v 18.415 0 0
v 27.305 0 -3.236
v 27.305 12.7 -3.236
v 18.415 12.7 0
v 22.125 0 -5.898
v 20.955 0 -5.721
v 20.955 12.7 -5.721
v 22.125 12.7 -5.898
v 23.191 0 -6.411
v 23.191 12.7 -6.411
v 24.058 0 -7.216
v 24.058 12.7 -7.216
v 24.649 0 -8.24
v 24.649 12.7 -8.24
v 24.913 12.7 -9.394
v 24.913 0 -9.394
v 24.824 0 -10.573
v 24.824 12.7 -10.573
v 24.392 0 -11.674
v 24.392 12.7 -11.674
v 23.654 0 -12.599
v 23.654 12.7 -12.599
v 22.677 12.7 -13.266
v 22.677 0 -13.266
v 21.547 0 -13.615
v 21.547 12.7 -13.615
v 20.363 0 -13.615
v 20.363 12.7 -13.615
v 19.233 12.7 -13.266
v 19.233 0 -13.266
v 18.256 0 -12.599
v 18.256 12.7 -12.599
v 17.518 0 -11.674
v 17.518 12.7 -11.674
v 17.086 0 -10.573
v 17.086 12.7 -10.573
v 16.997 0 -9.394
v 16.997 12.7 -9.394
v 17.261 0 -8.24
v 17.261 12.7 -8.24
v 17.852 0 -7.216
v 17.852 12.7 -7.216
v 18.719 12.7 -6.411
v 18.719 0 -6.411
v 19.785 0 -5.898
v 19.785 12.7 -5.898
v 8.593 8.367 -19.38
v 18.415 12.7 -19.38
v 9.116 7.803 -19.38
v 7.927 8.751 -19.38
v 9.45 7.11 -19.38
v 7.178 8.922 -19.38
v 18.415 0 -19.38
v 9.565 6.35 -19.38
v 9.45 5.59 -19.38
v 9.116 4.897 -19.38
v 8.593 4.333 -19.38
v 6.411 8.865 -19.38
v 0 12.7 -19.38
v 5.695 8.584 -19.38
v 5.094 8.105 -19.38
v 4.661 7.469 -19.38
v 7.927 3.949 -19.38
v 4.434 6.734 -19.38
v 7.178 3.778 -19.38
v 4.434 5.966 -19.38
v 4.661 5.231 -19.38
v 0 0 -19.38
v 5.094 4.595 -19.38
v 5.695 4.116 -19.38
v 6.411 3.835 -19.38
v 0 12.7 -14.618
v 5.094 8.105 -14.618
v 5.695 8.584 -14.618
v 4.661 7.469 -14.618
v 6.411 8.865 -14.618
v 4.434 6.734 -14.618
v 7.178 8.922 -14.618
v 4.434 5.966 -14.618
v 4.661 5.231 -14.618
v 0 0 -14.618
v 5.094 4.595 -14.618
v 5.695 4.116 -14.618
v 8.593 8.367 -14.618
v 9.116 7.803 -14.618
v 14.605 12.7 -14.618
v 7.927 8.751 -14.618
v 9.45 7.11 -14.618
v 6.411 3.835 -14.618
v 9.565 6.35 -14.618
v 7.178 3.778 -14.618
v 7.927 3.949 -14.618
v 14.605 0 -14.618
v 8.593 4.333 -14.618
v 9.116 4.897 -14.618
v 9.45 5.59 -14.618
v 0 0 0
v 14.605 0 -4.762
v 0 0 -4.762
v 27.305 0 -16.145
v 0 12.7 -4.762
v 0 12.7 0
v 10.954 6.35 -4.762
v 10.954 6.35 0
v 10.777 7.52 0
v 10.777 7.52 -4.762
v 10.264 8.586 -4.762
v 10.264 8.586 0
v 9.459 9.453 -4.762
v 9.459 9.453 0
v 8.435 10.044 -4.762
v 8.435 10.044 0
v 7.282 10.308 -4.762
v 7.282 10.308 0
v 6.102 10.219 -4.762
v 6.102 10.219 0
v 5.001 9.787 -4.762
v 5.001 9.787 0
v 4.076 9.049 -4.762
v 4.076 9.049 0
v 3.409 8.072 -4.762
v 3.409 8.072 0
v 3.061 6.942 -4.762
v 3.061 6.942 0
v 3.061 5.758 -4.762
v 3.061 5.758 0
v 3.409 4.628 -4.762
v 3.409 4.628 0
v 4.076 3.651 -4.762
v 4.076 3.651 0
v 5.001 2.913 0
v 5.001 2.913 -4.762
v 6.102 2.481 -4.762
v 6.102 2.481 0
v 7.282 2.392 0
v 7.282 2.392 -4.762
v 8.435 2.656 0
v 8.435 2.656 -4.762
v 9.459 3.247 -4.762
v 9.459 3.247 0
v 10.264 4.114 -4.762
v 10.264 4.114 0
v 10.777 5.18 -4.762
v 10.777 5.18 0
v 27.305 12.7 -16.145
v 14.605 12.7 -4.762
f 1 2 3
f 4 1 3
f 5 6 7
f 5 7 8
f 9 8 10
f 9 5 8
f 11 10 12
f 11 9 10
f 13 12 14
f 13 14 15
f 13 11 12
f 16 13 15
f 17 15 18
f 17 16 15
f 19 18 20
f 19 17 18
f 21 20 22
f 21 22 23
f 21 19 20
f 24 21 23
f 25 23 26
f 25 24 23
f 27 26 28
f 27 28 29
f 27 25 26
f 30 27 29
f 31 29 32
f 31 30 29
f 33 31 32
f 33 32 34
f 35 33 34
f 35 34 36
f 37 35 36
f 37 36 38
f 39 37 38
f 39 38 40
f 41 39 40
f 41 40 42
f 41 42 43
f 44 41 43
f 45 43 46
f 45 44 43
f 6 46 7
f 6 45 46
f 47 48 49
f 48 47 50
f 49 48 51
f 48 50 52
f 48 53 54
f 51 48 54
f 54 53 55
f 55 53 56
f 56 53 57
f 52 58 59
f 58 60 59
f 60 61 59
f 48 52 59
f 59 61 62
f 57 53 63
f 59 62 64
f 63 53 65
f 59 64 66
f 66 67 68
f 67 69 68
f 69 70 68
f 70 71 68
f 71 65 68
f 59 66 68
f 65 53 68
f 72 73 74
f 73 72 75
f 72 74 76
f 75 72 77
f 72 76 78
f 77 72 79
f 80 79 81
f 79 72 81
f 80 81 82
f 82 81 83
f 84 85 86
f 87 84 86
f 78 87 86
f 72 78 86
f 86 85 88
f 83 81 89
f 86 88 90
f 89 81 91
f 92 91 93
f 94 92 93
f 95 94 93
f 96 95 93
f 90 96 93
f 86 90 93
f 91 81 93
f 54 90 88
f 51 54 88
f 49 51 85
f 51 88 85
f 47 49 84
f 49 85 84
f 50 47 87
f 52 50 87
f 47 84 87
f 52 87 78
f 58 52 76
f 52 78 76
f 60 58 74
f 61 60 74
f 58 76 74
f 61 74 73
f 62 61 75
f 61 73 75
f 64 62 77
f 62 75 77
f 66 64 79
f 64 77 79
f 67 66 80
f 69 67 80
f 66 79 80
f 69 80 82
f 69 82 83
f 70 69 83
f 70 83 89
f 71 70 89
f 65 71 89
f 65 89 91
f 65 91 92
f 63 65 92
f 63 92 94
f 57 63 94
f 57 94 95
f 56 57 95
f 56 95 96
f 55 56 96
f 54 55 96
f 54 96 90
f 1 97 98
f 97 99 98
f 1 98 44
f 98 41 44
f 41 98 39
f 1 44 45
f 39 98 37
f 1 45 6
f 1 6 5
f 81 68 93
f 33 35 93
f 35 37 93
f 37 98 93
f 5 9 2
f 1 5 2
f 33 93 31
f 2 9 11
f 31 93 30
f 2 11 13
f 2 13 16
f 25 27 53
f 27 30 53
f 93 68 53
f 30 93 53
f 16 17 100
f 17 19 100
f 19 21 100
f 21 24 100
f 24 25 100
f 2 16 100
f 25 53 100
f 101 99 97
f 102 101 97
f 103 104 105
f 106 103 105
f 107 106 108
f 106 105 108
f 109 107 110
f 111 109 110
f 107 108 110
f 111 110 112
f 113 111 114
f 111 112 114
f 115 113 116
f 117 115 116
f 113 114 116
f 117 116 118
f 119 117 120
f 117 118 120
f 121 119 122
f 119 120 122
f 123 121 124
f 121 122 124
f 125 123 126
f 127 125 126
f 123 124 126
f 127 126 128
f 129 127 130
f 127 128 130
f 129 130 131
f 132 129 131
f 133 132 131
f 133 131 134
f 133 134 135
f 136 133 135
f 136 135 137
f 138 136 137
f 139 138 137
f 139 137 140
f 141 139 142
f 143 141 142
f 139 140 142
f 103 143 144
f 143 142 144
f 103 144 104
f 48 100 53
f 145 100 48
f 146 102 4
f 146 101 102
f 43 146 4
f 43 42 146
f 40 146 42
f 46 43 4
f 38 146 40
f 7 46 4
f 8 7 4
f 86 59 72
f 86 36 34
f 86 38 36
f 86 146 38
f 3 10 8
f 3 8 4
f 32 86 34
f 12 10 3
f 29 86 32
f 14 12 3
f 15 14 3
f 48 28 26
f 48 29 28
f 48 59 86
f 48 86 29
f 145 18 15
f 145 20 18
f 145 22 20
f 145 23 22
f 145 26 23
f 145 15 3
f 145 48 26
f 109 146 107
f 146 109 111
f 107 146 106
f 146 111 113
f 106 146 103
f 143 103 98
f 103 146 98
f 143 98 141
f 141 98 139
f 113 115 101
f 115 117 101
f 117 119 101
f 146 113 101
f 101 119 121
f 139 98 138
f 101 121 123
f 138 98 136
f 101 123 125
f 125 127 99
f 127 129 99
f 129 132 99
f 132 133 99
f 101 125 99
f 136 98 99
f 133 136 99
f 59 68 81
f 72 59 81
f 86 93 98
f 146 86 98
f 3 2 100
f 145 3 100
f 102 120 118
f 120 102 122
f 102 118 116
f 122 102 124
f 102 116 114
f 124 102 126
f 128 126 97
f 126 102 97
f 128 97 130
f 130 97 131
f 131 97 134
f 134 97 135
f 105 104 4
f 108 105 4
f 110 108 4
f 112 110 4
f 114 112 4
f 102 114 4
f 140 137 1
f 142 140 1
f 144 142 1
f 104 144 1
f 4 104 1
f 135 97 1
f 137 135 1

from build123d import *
from OCP.BRepFilletAPI import BRepFilletAPI_MakeChamfer

# Parameters (mm, degrees)
SKETCH1_R           = 3.96875
BOSS_EXTRUDE1_DEPTH = 12.7
SKETCH2_R           = 3.96875
CUT_EXTRUDE1_DEPTH  = 4.7625
SKETCH3_R           = 2.5796875
CUT_EXTRUDE2_DEPTH  = 34.474321177
CHAMFER1_SIZE       = 8.89
CHAMFER1_SIZE2      = 3.235695383


with BuildPart() as part:
    # Sketch1 → Boss-Extrude1 (new body)
    with BuildSketch(Plane(origin=(0, 0, 0), x_dir=(1, 0, 0), z_dir=(0, 1, 0))):
        Polygon((0, 0), (27.305, 0), (27.305, 19.3802), (0, 19.3802), (0, 14.6177), (14.605, 14.6177), (14.605, 4.7625), (0, 4.7625), align=None)
        with Locations(Location((20.955, 9.6901, 0), (0, 0, 270))):
            Circle(SKETCH1_R, mode=Mode.SUBTRACT)
    extrude(amount=BOSS_EXTRUDE1_DEPTH)

    # Sketch2 → Cut-Extrude1 (cut)
    with BuildSketch(Plane.XY):
        with Locations((6.985, 6.35)):
            Circle(SKETCH2_R)
    extrude(amount=-CUT_EXTRUDE1_DEPTH, mode=Mode.SUBTRACT)

    # Sketch3 → Cut-Extrude2 (cut, through all)
    with BuildSketch(Plane.XY.offset(-14.6177)):
        with Locations((6.985, 6.35)):
            Circle(SKETCH3_R)
    extrude(amount=-CUT_EXTRUDE2_DEPTH, mode=Mode.SUBTRACT)

    # Chamfer1: one chamfer whose edges measure the first distance from different faces: ONE call of the kernel's chamfer builder (chamfer() names one face for all edges)
    chamfer1_edges_1 = [part.edges().sort_by_distance(p)[0] for p in [
        (27.305, 6.35, -19.3802),
    ]]
    chamfer1_side_1 = [part.faces().sort_by_distance(p)[0] for p in [
        (14.080266617, 6.35, -19.3802),
    ]]
    chamfer1_edges_2 = [part.edges().sort_by_distance(p)[0] for p in [
        (27.305, 6.35, 0),
    ]]
    chamfer1_side_2 = [part.faces().sort_by_distance(p)[0] for p in [
        (14.762286847, 6.35, 0),
    ]]
    chamfer1 = BRepFilletAPI_MakeChamfer(part.part.solid().wrapped)
    for e in chamfer1_edges_1:
        chamfer1.Add(CHAMFER1_SIZE, CHAMFER1_SIZE2, e.wrapped, chamfer1_side_1[0].wrapped)  # the first distance lies on this face
    for e in chamfer1_edges_2:
        chamfer1.Add(CHAMFER1_SIZE, CHAMFER1_SIZE2, e.wrapped, chamfer1_side_2[0].wrapped)  # the first distance lies on this face
    add(Compound.cast(chamfer1.Shape()), mode=Mode.REPLACE)


solid = part.part
